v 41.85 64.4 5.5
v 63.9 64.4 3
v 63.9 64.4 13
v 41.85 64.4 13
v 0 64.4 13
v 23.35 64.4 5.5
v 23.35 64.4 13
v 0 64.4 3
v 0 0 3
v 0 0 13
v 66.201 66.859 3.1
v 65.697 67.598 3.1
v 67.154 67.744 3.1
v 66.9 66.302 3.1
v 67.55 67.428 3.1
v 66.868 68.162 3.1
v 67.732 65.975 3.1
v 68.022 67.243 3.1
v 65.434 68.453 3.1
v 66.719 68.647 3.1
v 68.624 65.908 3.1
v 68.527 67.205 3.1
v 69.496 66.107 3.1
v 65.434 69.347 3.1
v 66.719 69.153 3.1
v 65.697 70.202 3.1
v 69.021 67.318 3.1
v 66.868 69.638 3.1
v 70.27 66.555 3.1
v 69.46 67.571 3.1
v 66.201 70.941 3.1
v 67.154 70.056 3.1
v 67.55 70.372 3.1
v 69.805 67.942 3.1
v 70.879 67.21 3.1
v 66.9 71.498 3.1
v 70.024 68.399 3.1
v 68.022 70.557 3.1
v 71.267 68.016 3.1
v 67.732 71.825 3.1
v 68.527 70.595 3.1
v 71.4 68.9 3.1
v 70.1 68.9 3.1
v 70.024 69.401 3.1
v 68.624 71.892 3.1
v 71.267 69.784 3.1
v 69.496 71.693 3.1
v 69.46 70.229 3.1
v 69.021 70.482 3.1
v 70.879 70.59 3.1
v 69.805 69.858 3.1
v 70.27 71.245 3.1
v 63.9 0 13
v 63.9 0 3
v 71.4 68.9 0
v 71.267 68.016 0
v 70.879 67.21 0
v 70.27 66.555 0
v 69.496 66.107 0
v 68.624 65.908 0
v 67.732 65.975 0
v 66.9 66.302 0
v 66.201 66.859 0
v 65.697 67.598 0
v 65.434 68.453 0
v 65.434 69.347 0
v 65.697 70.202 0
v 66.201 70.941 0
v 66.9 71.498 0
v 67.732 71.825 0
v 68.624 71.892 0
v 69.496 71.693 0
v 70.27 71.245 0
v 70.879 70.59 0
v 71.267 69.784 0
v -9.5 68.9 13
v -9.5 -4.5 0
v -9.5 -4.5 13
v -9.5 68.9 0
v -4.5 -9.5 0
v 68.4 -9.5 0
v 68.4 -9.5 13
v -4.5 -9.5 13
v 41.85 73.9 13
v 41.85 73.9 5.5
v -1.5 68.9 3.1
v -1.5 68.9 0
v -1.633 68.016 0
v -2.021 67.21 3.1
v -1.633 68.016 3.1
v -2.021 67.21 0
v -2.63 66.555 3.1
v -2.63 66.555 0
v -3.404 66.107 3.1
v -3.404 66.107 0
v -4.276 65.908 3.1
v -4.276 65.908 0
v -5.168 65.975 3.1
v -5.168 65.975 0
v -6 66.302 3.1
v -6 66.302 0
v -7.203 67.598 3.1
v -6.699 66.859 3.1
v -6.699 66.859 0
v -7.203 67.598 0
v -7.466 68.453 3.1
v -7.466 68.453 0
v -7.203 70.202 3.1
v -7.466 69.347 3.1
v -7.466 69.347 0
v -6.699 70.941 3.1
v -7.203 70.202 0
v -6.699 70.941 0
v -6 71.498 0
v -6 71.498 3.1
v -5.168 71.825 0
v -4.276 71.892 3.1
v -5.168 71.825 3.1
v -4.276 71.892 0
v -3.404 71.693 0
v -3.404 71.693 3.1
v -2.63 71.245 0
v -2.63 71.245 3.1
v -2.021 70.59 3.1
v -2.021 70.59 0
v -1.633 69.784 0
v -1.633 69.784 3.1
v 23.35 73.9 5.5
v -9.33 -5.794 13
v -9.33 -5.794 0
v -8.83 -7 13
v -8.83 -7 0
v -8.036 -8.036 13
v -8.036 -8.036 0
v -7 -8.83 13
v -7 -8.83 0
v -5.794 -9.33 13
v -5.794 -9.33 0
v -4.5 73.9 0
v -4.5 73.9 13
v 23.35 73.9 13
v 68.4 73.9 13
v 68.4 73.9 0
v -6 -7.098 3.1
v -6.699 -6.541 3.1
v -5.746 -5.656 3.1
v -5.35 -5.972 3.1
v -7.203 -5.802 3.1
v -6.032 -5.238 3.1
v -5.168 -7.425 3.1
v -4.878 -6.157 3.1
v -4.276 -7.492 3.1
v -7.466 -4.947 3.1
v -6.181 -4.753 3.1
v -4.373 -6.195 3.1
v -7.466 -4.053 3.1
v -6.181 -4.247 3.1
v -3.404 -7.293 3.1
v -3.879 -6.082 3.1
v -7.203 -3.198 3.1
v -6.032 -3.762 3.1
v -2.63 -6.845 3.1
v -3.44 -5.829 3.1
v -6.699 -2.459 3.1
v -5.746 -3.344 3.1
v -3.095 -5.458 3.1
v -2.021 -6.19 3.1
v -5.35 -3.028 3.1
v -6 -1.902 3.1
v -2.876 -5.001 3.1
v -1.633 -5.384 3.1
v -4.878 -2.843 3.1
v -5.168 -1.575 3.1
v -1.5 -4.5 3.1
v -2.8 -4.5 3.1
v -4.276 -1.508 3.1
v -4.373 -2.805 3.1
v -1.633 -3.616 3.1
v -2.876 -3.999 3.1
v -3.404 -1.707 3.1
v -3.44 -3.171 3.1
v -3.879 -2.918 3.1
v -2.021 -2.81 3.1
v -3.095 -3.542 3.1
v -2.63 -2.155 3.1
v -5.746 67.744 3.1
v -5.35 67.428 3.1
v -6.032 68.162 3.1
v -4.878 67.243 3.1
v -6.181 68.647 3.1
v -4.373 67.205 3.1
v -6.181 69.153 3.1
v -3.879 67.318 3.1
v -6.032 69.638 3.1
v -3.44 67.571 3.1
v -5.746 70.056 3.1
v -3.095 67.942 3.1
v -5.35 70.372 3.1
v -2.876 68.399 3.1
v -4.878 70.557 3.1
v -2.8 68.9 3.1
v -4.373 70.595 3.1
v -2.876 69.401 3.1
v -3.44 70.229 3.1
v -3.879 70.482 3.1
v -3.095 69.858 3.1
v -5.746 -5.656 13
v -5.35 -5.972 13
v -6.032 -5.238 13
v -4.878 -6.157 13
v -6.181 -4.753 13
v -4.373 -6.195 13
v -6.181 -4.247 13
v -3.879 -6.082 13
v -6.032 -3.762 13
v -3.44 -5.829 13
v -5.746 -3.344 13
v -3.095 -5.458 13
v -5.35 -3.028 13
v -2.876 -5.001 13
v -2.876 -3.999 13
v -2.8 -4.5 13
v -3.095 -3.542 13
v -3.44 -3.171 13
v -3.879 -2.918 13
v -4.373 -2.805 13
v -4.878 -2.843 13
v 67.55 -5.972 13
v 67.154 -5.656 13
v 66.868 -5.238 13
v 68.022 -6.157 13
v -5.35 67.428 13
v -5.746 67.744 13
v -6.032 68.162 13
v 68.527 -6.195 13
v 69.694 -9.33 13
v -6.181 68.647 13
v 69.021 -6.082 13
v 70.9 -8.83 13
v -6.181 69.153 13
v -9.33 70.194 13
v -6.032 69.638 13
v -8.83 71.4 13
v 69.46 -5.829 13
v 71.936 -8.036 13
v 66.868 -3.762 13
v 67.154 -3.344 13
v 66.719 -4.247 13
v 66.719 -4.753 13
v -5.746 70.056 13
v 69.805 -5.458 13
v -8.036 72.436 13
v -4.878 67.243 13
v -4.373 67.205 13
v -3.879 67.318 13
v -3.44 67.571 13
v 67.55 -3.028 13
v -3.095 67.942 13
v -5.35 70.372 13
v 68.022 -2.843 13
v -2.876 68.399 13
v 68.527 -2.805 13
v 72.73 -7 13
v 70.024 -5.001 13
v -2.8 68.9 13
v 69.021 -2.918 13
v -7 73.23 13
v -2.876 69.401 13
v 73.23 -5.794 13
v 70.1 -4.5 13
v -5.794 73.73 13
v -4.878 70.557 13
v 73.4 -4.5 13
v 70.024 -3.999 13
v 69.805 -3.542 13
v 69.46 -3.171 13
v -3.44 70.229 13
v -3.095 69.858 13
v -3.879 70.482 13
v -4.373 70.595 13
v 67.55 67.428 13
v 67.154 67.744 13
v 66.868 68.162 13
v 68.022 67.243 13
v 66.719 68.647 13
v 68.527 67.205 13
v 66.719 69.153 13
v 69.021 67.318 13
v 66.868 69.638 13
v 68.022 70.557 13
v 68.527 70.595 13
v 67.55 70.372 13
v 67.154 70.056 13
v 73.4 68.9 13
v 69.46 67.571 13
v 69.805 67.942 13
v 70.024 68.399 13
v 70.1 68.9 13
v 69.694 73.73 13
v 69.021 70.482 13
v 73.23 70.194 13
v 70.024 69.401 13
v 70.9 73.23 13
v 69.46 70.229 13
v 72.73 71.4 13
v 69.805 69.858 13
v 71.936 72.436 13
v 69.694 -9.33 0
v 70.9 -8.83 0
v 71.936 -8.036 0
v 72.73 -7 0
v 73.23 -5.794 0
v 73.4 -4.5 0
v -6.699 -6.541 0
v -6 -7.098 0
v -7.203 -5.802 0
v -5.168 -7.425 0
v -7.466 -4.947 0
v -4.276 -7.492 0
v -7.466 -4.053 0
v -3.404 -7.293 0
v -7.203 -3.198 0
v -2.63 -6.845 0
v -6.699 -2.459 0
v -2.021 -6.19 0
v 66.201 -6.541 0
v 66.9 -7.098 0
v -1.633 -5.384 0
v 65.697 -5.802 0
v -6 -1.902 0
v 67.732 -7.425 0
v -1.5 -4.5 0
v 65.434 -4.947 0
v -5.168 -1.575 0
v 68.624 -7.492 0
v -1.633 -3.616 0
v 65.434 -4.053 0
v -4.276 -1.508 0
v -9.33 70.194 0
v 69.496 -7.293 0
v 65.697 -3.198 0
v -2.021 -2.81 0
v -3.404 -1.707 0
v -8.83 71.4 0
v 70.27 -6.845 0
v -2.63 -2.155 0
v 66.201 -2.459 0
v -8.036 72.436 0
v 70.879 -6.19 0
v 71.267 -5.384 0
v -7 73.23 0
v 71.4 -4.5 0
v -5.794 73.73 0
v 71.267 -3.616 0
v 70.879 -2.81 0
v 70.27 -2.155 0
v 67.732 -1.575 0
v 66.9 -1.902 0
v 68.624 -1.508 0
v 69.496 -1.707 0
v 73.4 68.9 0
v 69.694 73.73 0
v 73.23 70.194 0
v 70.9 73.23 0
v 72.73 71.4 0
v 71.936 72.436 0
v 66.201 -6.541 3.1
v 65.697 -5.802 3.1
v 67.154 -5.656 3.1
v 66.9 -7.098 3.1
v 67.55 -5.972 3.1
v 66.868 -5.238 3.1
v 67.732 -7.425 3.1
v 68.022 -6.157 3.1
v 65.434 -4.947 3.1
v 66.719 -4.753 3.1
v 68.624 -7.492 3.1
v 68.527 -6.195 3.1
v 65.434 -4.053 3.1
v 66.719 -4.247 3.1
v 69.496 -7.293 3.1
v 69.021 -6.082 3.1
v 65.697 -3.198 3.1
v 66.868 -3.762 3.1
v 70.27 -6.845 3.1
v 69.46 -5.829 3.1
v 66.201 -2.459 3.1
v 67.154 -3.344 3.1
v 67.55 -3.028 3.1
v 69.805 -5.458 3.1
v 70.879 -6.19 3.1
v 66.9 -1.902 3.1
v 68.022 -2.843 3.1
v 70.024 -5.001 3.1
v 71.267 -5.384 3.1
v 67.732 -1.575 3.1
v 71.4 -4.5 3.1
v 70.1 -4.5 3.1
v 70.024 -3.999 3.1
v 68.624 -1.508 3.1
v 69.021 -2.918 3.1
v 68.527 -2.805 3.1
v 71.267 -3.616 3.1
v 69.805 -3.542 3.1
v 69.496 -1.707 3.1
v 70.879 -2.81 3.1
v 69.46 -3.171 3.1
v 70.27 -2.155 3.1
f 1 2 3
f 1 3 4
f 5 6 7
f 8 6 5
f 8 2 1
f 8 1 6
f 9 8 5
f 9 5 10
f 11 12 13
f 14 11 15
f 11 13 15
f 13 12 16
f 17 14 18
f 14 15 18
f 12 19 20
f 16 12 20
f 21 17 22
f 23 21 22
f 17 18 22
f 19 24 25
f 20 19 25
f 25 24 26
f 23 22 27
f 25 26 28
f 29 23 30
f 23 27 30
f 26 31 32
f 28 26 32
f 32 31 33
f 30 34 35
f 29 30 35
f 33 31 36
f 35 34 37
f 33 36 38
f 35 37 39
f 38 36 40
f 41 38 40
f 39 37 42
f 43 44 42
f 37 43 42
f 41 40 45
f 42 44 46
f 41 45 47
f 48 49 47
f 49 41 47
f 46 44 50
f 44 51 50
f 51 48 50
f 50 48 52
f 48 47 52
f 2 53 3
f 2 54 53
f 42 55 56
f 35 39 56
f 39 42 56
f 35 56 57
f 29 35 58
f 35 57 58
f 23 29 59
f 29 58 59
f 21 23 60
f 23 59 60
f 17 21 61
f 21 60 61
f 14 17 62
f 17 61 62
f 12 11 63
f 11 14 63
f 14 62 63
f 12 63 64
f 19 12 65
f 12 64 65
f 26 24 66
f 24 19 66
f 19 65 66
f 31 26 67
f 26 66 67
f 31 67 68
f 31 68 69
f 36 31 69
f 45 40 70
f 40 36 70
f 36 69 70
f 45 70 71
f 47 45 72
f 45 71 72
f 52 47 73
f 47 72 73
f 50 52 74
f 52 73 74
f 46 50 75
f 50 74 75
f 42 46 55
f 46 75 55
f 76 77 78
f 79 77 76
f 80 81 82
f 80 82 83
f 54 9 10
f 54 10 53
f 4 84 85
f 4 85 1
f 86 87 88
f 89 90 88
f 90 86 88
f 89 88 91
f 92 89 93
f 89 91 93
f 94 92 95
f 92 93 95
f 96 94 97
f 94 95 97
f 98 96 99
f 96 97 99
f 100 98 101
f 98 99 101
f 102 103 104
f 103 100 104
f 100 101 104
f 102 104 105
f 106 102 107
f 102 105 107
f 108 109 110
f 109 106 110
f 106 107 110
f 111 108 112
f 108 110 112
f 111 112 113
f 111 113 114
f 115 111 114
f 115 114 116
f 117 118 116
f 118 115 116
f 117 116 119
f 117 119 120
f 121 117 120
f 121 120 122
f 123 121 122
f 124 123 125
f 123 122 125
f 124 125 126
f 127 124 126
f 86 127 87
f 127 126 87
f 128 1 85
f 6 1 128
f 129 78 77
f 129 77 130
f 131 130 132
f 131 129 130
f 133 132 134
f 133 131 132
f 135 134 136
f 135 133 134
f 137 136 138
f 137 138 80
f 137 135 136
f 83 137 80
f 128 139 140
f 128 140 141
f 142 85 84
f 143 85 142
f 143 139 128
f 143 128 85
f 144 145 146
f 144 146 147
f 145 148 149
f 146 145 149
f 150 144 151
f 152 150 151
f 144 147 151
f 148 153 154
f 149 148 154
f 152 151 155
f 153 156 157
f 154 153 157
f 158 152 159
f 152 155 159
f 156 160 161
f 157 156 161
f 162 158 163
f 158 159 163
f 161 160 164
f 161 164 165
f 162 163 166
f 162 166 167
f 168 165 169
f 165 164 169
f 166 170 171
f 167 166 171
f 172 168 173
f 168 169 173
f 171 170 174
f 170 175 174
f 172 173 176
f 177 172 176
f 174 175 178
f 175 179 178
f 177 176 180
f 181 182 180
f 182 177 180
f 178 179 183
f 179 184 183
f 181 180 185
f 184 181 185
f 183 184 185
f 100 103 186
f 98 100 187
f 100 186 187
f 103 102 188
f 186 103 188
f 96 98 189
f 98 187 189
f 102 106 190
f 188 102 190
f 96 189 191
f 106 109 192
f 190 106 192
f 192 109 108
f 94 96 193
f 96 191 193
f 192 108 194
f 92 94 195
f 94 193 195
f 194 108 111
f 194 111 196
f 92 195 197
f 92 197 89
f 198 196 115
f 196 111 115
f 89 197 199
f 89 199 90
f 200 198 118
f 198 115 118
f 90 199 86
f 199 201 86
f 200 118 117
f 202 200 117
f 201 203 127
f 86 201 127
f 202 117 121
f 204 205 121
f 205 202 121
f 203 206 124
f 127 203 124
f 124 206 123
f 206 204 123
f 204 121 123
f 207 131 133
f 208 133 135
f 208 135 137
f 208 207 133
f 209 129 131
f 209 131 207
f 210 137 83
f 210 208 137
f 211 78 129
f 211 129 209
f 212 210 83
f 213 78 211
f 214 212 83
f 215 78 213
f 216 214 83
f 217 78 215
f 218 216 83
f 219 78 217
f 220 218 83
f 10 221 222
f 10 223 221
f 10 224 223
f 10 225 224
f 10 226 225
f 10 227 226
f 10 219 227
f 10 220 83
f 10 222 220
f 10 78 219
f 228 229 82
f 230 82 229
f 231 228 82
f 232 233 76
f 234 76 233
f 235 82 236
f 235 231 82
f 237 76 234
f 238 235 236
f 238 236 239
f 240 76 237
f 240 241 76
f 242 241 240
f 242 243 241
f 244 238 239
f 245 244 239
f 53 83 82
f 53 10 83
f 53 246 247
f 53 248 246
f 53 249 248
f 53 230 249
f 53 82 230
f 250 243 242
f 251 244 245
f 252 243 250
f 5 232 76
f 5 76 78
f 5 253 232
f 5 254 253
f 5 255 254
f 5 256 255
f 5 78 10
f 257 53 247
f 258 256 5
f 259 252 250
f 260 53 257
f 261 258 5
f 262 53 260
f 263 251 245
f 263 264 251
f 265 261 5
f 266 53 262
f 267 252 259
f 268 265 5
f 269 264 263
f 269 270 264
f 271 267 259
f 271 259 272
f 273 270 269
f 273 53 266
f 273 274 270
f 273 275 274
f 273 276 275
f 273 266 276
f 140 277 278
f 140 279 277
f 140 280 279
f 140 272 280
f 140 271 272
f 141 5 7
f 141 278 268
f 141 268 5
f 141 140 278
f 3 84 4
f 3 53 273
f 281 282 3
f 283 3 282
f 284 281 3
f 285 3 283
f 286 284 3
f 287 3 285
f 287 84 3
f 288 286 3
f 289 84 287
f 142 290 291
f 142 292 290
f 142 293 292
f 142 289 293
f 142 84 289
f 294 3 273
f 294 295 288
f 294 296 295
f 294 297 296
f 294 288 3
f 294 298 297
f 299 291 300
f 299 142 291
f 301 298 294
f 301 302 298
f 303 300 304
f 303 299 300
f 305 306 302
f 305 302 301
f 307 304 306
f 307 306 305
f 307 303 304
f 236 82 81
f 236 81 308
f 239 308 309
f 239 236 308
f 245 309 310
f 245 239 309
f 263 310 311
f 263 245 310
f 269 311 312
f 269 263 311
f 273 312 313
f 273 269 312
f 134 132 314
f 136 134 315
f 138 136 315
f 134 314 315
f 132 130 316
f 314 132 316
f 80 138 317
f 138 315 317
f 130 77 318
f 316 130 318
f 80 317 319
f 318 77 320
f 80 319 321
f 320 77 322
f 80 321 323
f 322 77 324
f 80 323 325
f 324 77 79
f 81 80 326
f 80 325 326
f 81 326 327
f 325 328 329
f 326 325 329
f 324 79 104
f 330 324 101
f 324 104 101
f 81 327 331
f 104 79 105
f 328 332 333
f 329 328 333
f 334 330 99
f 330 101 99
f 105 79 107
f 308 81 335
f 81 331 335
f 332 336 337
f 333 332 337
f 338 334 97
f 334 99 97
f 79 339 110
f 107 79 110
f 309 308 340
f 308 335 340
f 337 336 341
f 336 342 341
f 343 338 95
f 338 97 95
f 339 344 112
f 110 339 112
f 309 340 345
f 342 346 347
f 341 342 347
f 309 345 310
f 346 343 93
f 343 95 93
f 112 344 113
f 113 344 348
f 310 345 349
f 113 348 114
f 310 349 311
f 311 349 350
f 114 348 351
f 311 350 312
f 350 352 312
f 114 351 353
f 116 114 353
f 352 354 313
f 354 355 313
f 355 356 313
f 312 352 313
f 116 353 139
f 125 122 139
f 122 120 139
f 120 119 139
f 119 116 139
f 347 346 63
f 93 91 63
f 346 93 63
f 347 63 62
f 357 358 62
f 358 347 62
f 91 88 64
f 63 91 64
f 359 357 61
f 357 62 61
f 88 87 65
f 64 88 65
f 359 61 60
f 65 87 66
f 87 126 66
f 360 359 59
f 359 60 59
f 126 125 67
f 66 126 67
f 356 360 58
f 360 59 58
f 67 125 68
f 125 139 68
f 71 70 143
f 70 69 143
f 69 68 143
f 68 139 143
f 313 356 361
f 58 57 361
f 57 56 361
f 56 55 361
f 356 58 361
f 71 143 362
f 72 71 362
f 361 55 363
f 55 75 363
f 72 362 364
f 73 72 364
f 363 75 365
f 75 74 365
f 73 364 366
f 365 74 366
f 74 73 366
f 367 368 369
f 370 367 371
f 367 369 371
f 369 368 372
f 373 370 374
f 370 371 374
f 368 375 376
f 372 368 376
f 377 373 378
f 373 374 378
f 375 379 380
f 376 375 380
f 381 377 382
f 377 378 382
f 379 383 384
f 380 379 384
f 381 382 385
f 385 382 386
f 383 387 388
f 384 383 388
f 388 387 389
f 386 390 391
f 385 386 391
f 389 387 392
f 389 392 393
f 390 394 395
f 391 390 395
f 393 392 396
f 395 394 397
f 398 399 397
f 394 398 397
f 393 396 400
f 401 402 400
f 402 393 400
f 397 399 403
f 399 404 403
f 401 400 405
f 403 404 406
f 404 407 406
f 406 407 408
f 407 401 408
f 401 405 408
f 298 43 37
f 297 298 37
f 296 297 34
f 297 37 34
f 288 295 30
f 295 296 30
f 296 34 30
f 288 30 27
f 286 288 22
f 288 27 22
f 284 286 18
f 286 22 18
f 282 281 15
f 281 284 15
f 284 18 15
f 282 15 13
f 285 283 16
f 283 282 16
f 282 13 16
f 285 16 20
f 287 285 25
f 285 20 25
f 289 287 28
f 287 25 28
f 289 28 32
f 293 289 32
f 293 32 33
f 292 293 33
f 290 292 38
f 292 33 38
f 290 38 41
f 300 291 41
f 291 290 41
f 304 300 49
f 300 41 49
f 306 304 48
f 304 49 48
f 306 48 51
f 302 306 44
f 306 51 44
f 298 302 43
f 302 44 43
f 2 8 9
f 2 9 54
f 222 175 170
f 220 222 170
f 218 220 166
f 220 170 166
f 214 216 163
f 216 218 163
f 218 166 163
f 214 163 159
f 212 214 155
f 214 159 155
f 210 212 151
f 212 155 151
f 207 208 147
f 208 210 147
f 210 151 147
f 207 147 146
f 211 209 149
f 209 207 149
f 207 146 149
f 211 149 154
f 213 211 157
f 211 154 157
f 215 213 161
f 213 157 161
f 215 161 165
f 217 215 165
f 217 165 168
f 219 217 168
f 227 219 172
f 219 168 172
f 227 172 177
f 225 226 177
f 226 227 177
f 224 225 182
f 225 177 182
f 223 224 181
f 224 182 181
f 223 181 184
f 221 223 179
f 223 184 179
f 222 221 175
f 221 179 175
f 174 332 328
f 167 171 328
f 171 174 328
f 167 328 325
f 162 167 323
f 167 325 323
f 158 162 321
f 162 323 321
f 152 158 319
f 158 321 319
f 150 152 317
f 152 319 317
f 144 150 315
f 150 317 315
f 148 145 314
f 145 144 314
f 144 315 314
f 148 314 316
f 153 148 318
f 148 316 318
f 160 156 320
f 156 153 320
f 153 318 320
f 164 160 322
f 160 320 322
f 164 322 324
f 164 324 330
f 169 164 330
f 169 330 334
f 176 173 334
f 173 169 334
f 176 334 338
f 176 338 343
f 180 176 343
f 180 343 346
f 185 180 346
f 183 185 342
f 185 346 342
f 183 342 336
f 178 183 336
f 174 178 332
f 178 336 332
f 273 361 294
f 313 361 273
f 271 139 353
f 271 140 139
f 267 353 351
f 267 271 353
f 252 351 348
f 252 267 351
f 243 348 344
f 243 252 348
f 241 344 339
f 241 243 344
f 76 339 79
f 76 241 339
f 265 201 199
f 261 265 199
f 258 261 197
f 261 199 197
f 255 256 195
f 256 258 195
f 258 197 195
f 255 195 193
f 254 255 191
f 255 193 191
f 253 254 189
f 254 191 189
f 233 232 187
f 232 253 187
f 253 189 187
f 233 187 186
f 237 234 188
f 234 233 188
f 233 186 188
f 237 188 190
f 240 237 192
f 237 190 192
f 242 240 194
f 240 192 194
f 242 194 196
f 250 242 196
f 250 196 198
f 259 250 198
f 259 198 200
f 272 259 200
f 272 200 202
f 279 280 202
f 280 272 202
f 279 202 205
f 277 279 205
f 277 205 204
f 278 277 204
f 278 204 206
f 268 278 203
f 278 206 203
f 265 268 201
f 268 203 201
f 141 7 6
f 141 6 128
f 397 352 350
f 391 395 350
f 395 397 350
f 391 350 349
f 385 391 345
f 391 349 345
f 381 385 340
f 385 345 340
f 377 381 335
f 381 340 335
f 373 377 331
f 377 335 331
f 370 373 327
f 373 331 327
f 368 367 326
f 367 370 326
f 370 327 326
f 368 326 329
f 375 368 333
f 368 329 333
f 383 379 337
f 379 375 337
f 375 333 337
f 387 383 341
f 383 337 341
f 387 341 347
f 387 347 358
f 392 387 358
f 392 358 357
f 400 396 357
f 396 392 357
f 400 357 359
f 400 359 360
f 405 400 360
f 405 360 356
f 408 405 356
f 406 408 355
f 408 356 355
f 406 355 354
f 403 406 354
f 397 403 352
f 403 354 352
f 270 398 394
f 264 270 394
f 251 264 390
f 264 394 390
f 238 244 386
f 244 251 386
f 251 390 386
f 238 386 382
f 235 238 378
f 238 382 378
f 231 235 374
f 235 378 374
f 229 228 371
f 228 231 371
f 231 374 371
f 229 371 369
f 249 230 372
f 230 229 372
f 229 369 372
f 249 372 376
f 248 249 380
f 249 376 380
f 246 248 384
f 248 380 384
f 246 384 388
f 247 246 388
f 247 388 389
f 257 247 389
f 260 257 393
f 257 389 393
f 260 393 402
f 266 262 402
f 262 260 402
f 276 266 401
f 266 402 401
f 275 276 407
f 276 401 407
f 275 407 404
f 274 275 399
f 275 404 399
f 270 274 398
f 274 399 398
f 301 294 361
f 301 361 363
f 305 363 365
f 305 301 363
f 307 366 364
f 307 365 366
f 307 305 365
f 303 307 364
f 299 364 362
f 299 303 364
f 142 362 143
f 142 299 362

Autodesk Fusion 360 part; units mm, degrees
sketch "Skectch1" plane through (0, 0, 0) normal (0, 0, 1) x (1, 0, 0)
  line L0 (0, 0) -> (63.9, 0)
  line L1 (63.9, 0) -> (63.9, 64.4)
  line L2 (63.9, 64.4) -> (0, 64.4)
  line L3 (0, 64.4) -> (0, 0)
  line L4 (-9.5, 73.9) -> (73.4, 73.9)
  line L5 (73.4, 73.9) -> (73.4, -9.5)
  line L6 (73.4, -9.5) -> (-9.5, -9.5)
  line L7 (-9.5, -9.5) -> (-9.5, 73.9)
  circle A0 centre (-4.5, -4.5) radius 1.7
  circle A1 centre (68.4, -4.5) radius 1.7
  circle A2 centre (68.4, 68.9) radius 1.7
  circle A3 centre (-4.5, 68.9) radius 1.7
  circle A4 centre (-4.5, -4.5) radius 3
  circle A5 centre (68.4, -4.5) radius 3
  circle A6 centre (68.4, 68.9) radius 3
  circle A7 centre (-4.5, 68.9) radius 3
  dimension "d1" = 63.9
  dimension "d2" = 64.4
  dimension "d3" = 82.9
  dimension "d4" = 83.4
  dimension "d6" = 9.5
  dimension "d7" = 3.4
  dimension "d8" = 5
  dimension "d9" = 5
  dimension "d10" = 3.4
  dimension "d11" = 5
  dimension "d12" = 5
  dimension "d13" = 3.4
  dimension "d14" = 5
  dimension "d15" = 5
  dimension "d16" = 9.5
  dimension "d17" = 3.4
  dimension "d18" = 5
  dimension "d19" = 5
  dimension "d21" = 6
  dimension "d22" = 6
  dimension "d23" = 6
  dimension "d24" = 6
extrude "Extrude1" add sketch "Skectch1" along normal blind 9.9 from surface at 3.1 contours A4 | A5 | A6 | A7 makes body 1 at (70.9599, 70.4643, 9.7) makes body 2 at (-1.6809, 67.8739, 9.7) makes body 3 at (69.2125, -1.6121, 9.7) makes body 4 at (-1.5037, -4.6495, 9.7)
extrude "Extrude2" add sketch "Skectch1" along normal blind 13 contours L4 L5 L6 L7 bodies 1 2 3 4
extrude "Extrude3" add sketch "Skectch1" along normal blind 3 contours L0 L1 L2 L3 bodies 1
sketch "Sketch3" plane through (0, 0, 13) normal (0, 0, 1) x (-1, 0, 0)
  circle A0 centre (-68.4, -68.9) radius 1.7
  circle A1 centre (4.5, 4.5) radius 1.7
  line L0 (0, 0) -> (0, -64.4)
  line L1 (0, -64.4) -> (-63.9, -64.4)
  line L2 (-63.9, -64.4) -> (-63.9, 0)
  line L3 (-63.9, 0) -> (0, 0)
  line L4 (9.5, 9.5) -> (-73.4, 9.5)
  line L5 (-73.4, 9.5) -> (-73.4, -73.9)
  line L6 (-73.4, -73.9) -> (9.5, -73.9)
  line L7 (9.5, -73.9) -> (9.5, 9.5)
  circle A2 centre (4.5, -68.9) radius 1.7
  circle A3 centre (-68.4, 4.5) radius 1.7
  line L8 (-23.35, -73.9) -> (-41.85, -73.9)
  line L9 (-41.85, -73.9) -> (-41.85, -64.4)
  line L10 (-41.85, -64.4) -> (-23.35, -64.4)
  line L11 (-23.35, -64.4) -> (-23.35, -73.9)
  line L12 (9.5, 9.5) -> (9.5, -73.9)
  line L13 (-73.4, -73.9) -> (-73.4, 9.5)
  dimension "d32" = 18.5
  dimension "d33" = 32.85
  dimension "d34" = 31.55
extrude "Extrude4" cut sketch "Sketch3" against normal blind 7.5 contours L1 L6 L8 L9 L10 L11 bodies 1
fillet "Fillet1" radius 5 4 edges at (73.4, -9.5, 6.5) (73.4, 73.9, 6.5) (-9.5, 73.9, 6.5) (-9.5, -9.5, 6.5) on bodies 1
